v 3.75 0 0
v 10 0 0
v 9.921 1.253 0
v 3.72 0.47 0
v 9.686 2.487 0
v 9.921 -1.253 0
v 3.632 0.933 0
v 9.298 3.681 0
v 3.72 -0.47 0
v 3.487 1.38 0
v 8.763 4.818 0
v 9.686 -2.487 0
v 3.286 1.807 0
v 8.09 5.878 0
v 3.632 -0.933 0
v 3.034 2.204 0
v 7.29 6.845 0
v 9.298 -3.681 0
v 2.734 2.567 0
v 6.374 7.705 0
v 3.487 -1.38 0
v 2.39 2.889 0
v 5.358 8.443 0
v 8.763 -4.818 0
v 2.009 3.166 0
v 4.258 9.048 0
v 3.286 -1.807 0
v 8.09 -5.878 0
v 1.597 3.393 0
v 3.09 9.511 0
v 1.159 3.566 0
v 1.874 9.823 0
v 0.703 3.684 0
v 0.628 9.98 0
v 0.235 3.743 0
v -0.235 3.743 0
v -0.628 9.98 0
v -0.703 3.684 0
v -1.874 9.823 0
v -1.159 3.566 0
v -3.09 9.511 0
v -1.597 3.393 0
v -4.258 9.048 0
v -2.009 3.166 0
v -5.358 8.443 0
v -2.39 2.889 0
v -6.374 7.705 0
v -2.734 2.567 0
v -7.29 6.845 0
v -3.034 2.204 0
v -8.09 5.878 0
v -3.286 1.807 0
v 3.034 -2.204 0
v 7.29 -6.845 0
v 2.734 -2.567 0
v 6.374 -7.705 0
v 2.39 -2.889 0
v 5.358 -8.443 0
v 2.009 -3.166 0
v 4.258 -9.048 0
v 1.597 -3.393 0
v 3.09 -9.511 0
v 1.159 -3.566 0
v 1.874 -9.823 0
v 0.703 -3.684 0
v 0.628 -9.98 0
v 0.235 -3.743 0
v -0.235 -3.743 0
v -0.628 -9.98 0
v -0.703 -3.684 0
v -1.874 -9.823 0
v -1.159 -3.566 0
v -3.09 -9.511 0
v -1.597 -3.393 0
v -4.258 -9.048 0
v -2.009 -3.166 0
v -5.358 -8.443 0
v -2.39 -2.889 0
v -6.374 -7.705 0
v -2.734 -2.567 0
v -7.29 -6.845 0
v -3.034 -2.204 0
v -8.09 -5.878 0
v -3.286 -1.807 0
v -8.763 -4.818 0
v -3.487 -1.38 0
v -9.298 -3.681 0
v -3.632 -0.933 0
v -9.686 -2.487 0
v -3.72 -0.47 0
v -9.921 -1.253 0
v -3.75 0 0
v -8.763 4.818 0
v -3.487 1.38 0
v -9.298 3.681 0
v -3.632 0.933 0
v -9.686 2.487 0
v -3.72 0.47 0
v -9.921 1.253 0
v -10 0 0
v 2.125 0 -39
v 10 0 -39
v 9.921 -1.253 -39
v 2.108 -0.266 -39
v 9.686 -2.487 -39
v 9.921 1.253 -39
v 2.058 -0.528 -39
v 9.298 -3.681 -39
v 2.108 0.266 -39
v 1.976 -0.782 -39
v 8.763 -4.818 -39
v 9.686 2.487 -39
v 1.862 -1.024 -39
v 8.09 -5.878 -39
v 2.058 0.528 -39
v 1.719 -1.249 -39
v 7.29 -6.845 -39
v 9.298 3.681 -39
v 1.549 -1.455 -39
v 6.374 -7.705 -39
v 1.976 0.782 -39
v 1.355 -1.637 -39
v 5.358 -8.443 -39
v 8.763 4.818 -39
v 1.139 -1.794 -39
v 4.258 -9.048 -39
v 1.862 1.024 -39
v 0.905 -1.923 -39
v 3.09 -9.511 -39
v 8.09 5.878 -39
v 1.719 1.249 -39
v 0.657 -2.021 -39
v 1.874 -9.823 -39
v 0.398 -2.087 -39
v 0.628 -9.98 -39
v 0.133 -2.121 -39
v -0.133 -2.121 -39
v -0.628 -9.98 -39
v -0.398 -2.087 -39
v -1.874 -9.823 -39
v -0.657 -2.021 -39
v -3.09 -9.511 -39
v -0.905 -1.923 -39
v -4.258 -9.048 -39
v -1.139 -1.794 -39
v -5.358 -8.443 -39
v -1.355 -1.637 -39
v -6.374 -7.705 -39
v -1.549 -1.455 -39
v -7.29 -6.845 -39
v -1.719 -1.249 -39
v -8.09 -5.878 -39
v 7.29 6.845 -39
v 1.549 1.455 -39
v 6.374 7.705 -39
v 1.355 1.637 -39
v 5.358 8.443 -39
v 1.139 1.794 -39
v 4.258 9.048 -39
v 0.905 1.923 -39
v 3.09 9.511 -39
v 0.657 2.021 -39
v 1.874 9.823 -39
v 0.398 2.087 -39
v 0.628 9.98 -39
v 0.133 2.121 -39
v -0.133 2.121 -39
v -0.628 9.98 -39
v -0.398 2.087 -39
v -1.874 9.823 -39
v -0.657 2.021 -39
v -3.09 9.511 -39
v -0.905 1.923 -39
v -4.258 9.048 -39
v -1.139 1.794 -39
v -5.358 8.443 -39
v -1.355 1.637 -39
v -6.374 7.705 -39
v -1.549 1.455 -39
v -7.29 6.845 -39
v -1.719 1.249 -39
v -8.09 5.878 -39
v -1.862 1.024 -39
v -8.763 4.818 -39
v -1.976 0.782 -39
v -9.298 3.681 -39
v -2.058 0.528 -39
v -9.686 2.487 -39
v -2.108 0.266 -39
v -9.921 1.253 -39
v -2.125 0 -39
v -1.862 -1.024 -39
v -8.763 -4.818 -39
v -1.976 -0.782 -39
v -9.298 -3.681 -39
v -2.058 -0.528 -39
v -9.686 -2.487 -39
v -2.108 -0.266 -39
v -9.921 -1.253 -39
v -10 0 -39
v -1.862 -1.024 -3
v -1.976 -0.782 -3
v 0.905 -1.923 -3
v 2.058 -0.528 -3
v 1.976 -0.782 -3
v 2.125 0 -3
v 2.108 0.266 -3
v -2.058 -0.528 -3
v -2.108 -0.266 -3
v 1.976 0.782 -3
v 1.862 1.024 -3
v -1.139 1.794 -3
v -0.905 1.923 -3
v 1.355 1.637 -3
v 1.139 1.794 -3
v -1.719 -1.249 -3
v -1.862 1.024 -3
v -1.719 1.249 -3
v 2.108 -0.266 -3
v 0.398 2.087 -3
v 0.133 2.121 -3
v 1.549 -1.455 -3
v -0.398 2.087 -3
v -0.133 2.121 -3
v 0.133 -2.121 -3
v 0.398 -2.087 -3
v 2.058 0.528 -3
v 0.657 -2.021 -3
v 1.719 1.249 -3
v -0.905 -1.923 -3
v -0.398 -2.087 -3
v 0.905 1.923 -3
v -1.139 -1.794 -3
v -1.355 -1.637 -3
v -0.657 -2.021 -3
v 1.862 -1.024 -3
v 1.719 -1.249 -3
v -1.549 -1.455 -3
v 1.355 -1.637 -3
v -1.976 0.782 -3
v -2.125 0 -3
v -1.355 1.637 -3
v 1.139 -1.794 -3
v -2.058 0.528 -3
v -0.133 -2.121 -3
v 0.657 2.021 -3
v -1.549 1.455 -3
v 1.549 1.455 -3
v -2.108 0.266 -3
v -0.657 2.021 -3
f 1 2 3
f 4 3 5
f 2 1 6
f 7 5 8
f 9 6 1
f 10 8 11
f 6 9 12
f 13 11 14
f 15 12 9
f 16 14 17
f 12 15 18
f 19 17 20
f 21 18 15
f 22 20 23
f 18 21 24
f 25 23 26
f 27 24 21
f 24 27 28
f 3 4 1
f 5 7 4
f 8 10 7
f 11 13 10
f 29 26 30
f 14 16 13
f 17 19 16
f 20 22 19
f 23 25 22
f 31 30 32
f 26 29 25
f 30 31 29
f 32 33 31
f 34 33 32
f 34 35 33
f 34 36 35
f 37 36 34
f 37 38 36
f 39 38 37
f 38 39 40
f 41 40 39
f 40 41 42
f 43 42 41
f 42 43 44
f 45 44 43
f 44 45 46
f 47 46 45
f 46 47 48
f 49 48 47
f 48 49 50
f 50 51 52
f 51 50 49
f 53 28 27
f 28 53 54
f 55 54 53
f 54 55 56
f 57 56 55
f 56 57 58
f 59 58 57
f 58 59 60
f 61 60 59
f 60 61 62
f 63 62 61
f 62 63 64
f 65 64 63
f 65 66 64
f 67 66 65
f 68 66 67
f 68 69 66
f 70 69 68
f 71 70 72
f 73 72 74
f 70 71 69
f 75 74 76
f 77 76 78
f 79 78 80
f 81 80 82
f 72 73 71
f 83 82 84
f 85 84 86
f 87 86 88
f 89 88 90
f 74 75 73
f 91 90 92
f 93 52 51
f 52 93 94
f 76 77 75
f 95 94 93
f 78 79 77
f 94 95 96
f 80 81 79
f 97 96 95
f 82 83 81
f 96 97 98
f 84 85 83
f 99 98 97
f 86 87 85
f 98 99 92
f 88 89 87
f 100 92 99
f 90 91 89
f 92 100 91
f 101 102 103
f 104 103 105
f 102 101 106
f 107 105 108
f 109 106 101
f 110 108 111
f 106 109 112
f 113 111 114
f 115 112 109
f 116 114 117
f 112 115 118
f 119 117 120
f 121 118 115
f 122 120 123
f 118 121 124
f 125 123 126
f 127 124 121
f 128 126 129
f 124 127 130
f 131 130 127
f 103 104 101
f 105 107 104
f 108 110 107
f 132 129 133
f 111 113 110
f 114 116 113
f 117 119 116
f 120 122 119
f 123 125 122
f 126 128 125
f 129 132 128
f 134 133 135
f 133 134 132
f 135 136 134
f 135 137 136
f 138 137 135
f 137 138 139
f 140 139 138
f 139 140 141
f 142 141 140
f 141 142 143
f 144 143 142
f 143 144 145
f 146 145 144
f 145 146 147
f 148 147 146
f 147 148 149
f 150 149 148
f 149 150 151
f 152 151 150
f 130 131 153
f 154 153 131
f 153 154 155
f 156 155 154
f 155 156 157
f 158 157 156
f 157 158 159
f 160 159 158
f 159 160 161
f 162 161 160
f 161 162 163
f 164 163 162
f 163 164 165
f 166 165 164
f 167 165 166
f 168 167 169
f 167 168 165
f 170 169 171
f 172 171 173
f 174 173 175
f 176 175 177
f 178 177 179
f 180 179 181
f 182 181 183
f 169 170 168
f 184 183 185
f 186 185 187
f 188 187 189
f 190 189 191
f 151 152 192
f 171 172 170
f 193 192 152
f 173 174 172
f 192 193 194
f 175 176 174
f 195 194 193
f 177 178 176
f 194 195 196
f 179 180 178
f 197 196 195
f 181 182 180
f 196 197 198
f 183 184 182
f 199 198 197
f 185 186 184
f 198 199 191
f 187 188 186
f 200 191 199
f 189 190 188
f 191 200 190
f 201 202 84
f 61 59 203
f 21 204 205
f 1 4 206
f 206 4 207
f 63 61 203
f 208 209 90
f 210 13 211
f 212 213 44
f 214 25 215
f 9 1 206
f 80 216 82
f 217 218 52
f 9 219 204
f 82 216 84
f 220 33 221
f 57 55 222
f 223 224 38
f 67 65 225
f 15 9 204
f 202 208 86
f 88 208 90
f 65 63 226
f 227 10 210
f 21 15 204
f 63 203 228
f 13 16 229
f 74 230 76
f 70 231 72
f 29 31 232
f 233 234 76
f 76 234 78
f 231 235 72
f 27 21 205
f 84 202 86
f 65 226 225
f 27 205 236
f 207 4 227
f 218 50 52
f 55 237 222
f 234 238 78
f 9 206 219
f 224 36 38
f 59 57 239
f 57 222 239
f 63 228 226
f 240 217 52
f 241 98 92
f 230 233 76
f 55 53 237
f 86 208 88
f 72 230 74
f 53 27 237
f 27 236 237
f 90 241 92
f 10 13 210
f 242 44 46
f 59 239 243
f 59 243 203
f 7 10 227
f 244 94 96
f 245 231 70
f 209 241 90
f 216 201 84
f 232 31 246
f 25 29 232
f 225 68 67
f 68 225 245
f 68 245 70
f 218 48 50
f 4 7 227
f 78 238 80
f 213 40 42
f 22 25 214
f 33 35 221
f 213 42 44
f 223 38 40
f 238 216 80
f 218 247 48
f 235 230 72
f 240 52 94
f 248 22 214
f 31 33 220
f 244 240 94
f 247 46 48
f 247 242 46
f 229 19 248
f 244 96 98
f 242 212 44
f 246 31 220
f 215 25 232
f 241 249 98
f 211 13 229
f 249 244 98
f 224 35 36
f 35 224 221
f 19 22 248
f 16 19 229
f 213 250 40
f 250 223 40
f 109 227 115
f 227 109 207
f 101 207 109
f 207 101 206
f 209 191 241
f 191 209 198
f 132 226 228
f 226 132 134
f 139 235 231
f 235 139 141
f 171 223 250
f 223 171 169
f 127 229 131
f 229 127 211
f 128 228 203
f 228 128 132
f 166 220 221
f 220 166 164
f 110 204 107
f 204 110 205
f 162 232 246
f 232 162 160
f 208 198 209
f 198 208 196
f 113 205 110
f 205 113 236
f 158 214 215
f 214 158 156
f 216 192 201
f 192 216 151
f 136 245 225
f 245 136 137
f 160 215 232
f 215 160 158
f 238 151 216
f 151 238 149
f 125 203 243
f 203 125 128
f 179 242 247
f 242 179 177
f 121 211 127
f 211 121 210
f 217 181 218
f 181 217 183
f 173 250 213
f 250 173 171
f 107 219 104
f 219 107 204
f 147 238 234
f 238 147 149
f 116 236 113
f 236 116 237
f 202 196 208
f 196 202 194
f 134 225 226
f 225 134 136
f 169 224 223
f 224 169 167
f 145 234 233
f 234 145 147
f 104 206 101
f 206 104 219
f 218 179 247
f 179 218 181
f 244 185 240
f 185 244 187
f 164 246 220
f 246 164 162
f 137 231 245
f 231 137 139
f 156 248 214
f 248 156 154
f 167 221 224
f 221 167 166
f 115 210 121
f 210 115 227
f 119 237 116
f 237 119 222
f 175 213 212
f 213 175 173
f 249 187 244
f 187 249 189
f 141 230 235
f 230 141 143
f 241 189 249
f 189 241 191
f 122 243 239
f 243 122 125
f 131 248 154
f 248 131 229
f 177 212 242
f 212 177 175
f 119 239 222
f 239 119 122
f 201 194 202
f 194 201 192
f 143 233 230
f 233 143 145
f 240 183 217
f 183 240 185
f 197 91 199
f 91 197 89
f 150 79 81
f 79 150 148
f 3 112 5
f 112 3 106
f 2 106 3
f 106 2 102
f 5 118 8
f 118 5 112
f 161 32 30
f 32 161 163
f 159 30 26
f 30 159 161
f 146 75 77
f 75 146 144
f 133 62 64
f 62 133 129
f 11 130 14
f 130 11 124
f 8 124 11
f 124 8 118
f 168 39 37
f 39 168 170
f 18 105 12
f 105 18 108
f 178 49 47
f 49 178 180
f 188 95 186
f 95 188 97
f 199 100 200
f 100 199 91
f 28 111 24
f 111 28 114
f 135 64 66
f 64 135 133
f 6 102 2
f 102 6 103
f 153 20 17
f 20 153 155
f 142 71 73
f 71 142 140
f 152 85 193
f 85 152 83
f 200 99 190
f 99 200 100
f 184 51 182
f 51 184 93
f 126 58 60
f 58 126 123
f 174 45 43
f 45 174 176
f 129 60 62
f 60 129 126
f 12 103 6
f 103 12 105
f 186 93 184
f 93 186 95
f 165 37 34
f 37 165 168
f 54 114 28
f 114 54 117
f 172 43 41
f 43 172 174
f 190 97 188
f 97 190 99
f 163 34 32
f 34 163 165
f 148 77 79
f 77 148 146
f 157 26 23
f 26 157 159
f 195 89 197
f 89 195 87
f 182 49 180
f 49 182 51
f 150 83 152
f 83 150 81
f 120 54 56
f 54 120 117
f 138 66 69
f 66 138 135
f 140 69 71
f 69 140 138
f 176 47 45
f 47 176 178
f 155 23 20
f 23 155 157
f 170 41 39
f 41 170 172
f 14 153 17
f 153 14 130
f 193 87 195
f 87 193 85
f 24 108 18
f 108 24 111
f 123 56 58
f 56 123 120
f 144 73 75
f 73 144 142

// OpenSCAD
$fn = 50;


difference() {
	union() {
		translate(v = [0, 0, -39.0000000000]) {
			cylinder(h = 39, r = 10.0000000000);
		}
		cylinder(h = 0, r = 13.0000000000);
	}
	union() {
		translate(v = [0, 0, 0]) {
			rotate(a = [0, 0, 0]) {
				difference() {
					union() {
						#translate(v = [0, 0, -39.0000000000]) {
							cylinder(h = 39, r = 2.0000000000);
						}
						#translate(v = [0, 0, -3]) {
							cylinder(h = 3, r1 = 2.1250000000, r2 = 3.7500000000);
						}
						#translate(v = [0, 0, -39.0000000000]) {
							cylinder(h = 39, r = 2.1250000000);
						}
						#translate(v = [0, 0, -39.0000000000]) {
							cylinder(h = 39, r = 2.0000000000);
						}
					}
					union();
				}
			}
		}
	}
}
